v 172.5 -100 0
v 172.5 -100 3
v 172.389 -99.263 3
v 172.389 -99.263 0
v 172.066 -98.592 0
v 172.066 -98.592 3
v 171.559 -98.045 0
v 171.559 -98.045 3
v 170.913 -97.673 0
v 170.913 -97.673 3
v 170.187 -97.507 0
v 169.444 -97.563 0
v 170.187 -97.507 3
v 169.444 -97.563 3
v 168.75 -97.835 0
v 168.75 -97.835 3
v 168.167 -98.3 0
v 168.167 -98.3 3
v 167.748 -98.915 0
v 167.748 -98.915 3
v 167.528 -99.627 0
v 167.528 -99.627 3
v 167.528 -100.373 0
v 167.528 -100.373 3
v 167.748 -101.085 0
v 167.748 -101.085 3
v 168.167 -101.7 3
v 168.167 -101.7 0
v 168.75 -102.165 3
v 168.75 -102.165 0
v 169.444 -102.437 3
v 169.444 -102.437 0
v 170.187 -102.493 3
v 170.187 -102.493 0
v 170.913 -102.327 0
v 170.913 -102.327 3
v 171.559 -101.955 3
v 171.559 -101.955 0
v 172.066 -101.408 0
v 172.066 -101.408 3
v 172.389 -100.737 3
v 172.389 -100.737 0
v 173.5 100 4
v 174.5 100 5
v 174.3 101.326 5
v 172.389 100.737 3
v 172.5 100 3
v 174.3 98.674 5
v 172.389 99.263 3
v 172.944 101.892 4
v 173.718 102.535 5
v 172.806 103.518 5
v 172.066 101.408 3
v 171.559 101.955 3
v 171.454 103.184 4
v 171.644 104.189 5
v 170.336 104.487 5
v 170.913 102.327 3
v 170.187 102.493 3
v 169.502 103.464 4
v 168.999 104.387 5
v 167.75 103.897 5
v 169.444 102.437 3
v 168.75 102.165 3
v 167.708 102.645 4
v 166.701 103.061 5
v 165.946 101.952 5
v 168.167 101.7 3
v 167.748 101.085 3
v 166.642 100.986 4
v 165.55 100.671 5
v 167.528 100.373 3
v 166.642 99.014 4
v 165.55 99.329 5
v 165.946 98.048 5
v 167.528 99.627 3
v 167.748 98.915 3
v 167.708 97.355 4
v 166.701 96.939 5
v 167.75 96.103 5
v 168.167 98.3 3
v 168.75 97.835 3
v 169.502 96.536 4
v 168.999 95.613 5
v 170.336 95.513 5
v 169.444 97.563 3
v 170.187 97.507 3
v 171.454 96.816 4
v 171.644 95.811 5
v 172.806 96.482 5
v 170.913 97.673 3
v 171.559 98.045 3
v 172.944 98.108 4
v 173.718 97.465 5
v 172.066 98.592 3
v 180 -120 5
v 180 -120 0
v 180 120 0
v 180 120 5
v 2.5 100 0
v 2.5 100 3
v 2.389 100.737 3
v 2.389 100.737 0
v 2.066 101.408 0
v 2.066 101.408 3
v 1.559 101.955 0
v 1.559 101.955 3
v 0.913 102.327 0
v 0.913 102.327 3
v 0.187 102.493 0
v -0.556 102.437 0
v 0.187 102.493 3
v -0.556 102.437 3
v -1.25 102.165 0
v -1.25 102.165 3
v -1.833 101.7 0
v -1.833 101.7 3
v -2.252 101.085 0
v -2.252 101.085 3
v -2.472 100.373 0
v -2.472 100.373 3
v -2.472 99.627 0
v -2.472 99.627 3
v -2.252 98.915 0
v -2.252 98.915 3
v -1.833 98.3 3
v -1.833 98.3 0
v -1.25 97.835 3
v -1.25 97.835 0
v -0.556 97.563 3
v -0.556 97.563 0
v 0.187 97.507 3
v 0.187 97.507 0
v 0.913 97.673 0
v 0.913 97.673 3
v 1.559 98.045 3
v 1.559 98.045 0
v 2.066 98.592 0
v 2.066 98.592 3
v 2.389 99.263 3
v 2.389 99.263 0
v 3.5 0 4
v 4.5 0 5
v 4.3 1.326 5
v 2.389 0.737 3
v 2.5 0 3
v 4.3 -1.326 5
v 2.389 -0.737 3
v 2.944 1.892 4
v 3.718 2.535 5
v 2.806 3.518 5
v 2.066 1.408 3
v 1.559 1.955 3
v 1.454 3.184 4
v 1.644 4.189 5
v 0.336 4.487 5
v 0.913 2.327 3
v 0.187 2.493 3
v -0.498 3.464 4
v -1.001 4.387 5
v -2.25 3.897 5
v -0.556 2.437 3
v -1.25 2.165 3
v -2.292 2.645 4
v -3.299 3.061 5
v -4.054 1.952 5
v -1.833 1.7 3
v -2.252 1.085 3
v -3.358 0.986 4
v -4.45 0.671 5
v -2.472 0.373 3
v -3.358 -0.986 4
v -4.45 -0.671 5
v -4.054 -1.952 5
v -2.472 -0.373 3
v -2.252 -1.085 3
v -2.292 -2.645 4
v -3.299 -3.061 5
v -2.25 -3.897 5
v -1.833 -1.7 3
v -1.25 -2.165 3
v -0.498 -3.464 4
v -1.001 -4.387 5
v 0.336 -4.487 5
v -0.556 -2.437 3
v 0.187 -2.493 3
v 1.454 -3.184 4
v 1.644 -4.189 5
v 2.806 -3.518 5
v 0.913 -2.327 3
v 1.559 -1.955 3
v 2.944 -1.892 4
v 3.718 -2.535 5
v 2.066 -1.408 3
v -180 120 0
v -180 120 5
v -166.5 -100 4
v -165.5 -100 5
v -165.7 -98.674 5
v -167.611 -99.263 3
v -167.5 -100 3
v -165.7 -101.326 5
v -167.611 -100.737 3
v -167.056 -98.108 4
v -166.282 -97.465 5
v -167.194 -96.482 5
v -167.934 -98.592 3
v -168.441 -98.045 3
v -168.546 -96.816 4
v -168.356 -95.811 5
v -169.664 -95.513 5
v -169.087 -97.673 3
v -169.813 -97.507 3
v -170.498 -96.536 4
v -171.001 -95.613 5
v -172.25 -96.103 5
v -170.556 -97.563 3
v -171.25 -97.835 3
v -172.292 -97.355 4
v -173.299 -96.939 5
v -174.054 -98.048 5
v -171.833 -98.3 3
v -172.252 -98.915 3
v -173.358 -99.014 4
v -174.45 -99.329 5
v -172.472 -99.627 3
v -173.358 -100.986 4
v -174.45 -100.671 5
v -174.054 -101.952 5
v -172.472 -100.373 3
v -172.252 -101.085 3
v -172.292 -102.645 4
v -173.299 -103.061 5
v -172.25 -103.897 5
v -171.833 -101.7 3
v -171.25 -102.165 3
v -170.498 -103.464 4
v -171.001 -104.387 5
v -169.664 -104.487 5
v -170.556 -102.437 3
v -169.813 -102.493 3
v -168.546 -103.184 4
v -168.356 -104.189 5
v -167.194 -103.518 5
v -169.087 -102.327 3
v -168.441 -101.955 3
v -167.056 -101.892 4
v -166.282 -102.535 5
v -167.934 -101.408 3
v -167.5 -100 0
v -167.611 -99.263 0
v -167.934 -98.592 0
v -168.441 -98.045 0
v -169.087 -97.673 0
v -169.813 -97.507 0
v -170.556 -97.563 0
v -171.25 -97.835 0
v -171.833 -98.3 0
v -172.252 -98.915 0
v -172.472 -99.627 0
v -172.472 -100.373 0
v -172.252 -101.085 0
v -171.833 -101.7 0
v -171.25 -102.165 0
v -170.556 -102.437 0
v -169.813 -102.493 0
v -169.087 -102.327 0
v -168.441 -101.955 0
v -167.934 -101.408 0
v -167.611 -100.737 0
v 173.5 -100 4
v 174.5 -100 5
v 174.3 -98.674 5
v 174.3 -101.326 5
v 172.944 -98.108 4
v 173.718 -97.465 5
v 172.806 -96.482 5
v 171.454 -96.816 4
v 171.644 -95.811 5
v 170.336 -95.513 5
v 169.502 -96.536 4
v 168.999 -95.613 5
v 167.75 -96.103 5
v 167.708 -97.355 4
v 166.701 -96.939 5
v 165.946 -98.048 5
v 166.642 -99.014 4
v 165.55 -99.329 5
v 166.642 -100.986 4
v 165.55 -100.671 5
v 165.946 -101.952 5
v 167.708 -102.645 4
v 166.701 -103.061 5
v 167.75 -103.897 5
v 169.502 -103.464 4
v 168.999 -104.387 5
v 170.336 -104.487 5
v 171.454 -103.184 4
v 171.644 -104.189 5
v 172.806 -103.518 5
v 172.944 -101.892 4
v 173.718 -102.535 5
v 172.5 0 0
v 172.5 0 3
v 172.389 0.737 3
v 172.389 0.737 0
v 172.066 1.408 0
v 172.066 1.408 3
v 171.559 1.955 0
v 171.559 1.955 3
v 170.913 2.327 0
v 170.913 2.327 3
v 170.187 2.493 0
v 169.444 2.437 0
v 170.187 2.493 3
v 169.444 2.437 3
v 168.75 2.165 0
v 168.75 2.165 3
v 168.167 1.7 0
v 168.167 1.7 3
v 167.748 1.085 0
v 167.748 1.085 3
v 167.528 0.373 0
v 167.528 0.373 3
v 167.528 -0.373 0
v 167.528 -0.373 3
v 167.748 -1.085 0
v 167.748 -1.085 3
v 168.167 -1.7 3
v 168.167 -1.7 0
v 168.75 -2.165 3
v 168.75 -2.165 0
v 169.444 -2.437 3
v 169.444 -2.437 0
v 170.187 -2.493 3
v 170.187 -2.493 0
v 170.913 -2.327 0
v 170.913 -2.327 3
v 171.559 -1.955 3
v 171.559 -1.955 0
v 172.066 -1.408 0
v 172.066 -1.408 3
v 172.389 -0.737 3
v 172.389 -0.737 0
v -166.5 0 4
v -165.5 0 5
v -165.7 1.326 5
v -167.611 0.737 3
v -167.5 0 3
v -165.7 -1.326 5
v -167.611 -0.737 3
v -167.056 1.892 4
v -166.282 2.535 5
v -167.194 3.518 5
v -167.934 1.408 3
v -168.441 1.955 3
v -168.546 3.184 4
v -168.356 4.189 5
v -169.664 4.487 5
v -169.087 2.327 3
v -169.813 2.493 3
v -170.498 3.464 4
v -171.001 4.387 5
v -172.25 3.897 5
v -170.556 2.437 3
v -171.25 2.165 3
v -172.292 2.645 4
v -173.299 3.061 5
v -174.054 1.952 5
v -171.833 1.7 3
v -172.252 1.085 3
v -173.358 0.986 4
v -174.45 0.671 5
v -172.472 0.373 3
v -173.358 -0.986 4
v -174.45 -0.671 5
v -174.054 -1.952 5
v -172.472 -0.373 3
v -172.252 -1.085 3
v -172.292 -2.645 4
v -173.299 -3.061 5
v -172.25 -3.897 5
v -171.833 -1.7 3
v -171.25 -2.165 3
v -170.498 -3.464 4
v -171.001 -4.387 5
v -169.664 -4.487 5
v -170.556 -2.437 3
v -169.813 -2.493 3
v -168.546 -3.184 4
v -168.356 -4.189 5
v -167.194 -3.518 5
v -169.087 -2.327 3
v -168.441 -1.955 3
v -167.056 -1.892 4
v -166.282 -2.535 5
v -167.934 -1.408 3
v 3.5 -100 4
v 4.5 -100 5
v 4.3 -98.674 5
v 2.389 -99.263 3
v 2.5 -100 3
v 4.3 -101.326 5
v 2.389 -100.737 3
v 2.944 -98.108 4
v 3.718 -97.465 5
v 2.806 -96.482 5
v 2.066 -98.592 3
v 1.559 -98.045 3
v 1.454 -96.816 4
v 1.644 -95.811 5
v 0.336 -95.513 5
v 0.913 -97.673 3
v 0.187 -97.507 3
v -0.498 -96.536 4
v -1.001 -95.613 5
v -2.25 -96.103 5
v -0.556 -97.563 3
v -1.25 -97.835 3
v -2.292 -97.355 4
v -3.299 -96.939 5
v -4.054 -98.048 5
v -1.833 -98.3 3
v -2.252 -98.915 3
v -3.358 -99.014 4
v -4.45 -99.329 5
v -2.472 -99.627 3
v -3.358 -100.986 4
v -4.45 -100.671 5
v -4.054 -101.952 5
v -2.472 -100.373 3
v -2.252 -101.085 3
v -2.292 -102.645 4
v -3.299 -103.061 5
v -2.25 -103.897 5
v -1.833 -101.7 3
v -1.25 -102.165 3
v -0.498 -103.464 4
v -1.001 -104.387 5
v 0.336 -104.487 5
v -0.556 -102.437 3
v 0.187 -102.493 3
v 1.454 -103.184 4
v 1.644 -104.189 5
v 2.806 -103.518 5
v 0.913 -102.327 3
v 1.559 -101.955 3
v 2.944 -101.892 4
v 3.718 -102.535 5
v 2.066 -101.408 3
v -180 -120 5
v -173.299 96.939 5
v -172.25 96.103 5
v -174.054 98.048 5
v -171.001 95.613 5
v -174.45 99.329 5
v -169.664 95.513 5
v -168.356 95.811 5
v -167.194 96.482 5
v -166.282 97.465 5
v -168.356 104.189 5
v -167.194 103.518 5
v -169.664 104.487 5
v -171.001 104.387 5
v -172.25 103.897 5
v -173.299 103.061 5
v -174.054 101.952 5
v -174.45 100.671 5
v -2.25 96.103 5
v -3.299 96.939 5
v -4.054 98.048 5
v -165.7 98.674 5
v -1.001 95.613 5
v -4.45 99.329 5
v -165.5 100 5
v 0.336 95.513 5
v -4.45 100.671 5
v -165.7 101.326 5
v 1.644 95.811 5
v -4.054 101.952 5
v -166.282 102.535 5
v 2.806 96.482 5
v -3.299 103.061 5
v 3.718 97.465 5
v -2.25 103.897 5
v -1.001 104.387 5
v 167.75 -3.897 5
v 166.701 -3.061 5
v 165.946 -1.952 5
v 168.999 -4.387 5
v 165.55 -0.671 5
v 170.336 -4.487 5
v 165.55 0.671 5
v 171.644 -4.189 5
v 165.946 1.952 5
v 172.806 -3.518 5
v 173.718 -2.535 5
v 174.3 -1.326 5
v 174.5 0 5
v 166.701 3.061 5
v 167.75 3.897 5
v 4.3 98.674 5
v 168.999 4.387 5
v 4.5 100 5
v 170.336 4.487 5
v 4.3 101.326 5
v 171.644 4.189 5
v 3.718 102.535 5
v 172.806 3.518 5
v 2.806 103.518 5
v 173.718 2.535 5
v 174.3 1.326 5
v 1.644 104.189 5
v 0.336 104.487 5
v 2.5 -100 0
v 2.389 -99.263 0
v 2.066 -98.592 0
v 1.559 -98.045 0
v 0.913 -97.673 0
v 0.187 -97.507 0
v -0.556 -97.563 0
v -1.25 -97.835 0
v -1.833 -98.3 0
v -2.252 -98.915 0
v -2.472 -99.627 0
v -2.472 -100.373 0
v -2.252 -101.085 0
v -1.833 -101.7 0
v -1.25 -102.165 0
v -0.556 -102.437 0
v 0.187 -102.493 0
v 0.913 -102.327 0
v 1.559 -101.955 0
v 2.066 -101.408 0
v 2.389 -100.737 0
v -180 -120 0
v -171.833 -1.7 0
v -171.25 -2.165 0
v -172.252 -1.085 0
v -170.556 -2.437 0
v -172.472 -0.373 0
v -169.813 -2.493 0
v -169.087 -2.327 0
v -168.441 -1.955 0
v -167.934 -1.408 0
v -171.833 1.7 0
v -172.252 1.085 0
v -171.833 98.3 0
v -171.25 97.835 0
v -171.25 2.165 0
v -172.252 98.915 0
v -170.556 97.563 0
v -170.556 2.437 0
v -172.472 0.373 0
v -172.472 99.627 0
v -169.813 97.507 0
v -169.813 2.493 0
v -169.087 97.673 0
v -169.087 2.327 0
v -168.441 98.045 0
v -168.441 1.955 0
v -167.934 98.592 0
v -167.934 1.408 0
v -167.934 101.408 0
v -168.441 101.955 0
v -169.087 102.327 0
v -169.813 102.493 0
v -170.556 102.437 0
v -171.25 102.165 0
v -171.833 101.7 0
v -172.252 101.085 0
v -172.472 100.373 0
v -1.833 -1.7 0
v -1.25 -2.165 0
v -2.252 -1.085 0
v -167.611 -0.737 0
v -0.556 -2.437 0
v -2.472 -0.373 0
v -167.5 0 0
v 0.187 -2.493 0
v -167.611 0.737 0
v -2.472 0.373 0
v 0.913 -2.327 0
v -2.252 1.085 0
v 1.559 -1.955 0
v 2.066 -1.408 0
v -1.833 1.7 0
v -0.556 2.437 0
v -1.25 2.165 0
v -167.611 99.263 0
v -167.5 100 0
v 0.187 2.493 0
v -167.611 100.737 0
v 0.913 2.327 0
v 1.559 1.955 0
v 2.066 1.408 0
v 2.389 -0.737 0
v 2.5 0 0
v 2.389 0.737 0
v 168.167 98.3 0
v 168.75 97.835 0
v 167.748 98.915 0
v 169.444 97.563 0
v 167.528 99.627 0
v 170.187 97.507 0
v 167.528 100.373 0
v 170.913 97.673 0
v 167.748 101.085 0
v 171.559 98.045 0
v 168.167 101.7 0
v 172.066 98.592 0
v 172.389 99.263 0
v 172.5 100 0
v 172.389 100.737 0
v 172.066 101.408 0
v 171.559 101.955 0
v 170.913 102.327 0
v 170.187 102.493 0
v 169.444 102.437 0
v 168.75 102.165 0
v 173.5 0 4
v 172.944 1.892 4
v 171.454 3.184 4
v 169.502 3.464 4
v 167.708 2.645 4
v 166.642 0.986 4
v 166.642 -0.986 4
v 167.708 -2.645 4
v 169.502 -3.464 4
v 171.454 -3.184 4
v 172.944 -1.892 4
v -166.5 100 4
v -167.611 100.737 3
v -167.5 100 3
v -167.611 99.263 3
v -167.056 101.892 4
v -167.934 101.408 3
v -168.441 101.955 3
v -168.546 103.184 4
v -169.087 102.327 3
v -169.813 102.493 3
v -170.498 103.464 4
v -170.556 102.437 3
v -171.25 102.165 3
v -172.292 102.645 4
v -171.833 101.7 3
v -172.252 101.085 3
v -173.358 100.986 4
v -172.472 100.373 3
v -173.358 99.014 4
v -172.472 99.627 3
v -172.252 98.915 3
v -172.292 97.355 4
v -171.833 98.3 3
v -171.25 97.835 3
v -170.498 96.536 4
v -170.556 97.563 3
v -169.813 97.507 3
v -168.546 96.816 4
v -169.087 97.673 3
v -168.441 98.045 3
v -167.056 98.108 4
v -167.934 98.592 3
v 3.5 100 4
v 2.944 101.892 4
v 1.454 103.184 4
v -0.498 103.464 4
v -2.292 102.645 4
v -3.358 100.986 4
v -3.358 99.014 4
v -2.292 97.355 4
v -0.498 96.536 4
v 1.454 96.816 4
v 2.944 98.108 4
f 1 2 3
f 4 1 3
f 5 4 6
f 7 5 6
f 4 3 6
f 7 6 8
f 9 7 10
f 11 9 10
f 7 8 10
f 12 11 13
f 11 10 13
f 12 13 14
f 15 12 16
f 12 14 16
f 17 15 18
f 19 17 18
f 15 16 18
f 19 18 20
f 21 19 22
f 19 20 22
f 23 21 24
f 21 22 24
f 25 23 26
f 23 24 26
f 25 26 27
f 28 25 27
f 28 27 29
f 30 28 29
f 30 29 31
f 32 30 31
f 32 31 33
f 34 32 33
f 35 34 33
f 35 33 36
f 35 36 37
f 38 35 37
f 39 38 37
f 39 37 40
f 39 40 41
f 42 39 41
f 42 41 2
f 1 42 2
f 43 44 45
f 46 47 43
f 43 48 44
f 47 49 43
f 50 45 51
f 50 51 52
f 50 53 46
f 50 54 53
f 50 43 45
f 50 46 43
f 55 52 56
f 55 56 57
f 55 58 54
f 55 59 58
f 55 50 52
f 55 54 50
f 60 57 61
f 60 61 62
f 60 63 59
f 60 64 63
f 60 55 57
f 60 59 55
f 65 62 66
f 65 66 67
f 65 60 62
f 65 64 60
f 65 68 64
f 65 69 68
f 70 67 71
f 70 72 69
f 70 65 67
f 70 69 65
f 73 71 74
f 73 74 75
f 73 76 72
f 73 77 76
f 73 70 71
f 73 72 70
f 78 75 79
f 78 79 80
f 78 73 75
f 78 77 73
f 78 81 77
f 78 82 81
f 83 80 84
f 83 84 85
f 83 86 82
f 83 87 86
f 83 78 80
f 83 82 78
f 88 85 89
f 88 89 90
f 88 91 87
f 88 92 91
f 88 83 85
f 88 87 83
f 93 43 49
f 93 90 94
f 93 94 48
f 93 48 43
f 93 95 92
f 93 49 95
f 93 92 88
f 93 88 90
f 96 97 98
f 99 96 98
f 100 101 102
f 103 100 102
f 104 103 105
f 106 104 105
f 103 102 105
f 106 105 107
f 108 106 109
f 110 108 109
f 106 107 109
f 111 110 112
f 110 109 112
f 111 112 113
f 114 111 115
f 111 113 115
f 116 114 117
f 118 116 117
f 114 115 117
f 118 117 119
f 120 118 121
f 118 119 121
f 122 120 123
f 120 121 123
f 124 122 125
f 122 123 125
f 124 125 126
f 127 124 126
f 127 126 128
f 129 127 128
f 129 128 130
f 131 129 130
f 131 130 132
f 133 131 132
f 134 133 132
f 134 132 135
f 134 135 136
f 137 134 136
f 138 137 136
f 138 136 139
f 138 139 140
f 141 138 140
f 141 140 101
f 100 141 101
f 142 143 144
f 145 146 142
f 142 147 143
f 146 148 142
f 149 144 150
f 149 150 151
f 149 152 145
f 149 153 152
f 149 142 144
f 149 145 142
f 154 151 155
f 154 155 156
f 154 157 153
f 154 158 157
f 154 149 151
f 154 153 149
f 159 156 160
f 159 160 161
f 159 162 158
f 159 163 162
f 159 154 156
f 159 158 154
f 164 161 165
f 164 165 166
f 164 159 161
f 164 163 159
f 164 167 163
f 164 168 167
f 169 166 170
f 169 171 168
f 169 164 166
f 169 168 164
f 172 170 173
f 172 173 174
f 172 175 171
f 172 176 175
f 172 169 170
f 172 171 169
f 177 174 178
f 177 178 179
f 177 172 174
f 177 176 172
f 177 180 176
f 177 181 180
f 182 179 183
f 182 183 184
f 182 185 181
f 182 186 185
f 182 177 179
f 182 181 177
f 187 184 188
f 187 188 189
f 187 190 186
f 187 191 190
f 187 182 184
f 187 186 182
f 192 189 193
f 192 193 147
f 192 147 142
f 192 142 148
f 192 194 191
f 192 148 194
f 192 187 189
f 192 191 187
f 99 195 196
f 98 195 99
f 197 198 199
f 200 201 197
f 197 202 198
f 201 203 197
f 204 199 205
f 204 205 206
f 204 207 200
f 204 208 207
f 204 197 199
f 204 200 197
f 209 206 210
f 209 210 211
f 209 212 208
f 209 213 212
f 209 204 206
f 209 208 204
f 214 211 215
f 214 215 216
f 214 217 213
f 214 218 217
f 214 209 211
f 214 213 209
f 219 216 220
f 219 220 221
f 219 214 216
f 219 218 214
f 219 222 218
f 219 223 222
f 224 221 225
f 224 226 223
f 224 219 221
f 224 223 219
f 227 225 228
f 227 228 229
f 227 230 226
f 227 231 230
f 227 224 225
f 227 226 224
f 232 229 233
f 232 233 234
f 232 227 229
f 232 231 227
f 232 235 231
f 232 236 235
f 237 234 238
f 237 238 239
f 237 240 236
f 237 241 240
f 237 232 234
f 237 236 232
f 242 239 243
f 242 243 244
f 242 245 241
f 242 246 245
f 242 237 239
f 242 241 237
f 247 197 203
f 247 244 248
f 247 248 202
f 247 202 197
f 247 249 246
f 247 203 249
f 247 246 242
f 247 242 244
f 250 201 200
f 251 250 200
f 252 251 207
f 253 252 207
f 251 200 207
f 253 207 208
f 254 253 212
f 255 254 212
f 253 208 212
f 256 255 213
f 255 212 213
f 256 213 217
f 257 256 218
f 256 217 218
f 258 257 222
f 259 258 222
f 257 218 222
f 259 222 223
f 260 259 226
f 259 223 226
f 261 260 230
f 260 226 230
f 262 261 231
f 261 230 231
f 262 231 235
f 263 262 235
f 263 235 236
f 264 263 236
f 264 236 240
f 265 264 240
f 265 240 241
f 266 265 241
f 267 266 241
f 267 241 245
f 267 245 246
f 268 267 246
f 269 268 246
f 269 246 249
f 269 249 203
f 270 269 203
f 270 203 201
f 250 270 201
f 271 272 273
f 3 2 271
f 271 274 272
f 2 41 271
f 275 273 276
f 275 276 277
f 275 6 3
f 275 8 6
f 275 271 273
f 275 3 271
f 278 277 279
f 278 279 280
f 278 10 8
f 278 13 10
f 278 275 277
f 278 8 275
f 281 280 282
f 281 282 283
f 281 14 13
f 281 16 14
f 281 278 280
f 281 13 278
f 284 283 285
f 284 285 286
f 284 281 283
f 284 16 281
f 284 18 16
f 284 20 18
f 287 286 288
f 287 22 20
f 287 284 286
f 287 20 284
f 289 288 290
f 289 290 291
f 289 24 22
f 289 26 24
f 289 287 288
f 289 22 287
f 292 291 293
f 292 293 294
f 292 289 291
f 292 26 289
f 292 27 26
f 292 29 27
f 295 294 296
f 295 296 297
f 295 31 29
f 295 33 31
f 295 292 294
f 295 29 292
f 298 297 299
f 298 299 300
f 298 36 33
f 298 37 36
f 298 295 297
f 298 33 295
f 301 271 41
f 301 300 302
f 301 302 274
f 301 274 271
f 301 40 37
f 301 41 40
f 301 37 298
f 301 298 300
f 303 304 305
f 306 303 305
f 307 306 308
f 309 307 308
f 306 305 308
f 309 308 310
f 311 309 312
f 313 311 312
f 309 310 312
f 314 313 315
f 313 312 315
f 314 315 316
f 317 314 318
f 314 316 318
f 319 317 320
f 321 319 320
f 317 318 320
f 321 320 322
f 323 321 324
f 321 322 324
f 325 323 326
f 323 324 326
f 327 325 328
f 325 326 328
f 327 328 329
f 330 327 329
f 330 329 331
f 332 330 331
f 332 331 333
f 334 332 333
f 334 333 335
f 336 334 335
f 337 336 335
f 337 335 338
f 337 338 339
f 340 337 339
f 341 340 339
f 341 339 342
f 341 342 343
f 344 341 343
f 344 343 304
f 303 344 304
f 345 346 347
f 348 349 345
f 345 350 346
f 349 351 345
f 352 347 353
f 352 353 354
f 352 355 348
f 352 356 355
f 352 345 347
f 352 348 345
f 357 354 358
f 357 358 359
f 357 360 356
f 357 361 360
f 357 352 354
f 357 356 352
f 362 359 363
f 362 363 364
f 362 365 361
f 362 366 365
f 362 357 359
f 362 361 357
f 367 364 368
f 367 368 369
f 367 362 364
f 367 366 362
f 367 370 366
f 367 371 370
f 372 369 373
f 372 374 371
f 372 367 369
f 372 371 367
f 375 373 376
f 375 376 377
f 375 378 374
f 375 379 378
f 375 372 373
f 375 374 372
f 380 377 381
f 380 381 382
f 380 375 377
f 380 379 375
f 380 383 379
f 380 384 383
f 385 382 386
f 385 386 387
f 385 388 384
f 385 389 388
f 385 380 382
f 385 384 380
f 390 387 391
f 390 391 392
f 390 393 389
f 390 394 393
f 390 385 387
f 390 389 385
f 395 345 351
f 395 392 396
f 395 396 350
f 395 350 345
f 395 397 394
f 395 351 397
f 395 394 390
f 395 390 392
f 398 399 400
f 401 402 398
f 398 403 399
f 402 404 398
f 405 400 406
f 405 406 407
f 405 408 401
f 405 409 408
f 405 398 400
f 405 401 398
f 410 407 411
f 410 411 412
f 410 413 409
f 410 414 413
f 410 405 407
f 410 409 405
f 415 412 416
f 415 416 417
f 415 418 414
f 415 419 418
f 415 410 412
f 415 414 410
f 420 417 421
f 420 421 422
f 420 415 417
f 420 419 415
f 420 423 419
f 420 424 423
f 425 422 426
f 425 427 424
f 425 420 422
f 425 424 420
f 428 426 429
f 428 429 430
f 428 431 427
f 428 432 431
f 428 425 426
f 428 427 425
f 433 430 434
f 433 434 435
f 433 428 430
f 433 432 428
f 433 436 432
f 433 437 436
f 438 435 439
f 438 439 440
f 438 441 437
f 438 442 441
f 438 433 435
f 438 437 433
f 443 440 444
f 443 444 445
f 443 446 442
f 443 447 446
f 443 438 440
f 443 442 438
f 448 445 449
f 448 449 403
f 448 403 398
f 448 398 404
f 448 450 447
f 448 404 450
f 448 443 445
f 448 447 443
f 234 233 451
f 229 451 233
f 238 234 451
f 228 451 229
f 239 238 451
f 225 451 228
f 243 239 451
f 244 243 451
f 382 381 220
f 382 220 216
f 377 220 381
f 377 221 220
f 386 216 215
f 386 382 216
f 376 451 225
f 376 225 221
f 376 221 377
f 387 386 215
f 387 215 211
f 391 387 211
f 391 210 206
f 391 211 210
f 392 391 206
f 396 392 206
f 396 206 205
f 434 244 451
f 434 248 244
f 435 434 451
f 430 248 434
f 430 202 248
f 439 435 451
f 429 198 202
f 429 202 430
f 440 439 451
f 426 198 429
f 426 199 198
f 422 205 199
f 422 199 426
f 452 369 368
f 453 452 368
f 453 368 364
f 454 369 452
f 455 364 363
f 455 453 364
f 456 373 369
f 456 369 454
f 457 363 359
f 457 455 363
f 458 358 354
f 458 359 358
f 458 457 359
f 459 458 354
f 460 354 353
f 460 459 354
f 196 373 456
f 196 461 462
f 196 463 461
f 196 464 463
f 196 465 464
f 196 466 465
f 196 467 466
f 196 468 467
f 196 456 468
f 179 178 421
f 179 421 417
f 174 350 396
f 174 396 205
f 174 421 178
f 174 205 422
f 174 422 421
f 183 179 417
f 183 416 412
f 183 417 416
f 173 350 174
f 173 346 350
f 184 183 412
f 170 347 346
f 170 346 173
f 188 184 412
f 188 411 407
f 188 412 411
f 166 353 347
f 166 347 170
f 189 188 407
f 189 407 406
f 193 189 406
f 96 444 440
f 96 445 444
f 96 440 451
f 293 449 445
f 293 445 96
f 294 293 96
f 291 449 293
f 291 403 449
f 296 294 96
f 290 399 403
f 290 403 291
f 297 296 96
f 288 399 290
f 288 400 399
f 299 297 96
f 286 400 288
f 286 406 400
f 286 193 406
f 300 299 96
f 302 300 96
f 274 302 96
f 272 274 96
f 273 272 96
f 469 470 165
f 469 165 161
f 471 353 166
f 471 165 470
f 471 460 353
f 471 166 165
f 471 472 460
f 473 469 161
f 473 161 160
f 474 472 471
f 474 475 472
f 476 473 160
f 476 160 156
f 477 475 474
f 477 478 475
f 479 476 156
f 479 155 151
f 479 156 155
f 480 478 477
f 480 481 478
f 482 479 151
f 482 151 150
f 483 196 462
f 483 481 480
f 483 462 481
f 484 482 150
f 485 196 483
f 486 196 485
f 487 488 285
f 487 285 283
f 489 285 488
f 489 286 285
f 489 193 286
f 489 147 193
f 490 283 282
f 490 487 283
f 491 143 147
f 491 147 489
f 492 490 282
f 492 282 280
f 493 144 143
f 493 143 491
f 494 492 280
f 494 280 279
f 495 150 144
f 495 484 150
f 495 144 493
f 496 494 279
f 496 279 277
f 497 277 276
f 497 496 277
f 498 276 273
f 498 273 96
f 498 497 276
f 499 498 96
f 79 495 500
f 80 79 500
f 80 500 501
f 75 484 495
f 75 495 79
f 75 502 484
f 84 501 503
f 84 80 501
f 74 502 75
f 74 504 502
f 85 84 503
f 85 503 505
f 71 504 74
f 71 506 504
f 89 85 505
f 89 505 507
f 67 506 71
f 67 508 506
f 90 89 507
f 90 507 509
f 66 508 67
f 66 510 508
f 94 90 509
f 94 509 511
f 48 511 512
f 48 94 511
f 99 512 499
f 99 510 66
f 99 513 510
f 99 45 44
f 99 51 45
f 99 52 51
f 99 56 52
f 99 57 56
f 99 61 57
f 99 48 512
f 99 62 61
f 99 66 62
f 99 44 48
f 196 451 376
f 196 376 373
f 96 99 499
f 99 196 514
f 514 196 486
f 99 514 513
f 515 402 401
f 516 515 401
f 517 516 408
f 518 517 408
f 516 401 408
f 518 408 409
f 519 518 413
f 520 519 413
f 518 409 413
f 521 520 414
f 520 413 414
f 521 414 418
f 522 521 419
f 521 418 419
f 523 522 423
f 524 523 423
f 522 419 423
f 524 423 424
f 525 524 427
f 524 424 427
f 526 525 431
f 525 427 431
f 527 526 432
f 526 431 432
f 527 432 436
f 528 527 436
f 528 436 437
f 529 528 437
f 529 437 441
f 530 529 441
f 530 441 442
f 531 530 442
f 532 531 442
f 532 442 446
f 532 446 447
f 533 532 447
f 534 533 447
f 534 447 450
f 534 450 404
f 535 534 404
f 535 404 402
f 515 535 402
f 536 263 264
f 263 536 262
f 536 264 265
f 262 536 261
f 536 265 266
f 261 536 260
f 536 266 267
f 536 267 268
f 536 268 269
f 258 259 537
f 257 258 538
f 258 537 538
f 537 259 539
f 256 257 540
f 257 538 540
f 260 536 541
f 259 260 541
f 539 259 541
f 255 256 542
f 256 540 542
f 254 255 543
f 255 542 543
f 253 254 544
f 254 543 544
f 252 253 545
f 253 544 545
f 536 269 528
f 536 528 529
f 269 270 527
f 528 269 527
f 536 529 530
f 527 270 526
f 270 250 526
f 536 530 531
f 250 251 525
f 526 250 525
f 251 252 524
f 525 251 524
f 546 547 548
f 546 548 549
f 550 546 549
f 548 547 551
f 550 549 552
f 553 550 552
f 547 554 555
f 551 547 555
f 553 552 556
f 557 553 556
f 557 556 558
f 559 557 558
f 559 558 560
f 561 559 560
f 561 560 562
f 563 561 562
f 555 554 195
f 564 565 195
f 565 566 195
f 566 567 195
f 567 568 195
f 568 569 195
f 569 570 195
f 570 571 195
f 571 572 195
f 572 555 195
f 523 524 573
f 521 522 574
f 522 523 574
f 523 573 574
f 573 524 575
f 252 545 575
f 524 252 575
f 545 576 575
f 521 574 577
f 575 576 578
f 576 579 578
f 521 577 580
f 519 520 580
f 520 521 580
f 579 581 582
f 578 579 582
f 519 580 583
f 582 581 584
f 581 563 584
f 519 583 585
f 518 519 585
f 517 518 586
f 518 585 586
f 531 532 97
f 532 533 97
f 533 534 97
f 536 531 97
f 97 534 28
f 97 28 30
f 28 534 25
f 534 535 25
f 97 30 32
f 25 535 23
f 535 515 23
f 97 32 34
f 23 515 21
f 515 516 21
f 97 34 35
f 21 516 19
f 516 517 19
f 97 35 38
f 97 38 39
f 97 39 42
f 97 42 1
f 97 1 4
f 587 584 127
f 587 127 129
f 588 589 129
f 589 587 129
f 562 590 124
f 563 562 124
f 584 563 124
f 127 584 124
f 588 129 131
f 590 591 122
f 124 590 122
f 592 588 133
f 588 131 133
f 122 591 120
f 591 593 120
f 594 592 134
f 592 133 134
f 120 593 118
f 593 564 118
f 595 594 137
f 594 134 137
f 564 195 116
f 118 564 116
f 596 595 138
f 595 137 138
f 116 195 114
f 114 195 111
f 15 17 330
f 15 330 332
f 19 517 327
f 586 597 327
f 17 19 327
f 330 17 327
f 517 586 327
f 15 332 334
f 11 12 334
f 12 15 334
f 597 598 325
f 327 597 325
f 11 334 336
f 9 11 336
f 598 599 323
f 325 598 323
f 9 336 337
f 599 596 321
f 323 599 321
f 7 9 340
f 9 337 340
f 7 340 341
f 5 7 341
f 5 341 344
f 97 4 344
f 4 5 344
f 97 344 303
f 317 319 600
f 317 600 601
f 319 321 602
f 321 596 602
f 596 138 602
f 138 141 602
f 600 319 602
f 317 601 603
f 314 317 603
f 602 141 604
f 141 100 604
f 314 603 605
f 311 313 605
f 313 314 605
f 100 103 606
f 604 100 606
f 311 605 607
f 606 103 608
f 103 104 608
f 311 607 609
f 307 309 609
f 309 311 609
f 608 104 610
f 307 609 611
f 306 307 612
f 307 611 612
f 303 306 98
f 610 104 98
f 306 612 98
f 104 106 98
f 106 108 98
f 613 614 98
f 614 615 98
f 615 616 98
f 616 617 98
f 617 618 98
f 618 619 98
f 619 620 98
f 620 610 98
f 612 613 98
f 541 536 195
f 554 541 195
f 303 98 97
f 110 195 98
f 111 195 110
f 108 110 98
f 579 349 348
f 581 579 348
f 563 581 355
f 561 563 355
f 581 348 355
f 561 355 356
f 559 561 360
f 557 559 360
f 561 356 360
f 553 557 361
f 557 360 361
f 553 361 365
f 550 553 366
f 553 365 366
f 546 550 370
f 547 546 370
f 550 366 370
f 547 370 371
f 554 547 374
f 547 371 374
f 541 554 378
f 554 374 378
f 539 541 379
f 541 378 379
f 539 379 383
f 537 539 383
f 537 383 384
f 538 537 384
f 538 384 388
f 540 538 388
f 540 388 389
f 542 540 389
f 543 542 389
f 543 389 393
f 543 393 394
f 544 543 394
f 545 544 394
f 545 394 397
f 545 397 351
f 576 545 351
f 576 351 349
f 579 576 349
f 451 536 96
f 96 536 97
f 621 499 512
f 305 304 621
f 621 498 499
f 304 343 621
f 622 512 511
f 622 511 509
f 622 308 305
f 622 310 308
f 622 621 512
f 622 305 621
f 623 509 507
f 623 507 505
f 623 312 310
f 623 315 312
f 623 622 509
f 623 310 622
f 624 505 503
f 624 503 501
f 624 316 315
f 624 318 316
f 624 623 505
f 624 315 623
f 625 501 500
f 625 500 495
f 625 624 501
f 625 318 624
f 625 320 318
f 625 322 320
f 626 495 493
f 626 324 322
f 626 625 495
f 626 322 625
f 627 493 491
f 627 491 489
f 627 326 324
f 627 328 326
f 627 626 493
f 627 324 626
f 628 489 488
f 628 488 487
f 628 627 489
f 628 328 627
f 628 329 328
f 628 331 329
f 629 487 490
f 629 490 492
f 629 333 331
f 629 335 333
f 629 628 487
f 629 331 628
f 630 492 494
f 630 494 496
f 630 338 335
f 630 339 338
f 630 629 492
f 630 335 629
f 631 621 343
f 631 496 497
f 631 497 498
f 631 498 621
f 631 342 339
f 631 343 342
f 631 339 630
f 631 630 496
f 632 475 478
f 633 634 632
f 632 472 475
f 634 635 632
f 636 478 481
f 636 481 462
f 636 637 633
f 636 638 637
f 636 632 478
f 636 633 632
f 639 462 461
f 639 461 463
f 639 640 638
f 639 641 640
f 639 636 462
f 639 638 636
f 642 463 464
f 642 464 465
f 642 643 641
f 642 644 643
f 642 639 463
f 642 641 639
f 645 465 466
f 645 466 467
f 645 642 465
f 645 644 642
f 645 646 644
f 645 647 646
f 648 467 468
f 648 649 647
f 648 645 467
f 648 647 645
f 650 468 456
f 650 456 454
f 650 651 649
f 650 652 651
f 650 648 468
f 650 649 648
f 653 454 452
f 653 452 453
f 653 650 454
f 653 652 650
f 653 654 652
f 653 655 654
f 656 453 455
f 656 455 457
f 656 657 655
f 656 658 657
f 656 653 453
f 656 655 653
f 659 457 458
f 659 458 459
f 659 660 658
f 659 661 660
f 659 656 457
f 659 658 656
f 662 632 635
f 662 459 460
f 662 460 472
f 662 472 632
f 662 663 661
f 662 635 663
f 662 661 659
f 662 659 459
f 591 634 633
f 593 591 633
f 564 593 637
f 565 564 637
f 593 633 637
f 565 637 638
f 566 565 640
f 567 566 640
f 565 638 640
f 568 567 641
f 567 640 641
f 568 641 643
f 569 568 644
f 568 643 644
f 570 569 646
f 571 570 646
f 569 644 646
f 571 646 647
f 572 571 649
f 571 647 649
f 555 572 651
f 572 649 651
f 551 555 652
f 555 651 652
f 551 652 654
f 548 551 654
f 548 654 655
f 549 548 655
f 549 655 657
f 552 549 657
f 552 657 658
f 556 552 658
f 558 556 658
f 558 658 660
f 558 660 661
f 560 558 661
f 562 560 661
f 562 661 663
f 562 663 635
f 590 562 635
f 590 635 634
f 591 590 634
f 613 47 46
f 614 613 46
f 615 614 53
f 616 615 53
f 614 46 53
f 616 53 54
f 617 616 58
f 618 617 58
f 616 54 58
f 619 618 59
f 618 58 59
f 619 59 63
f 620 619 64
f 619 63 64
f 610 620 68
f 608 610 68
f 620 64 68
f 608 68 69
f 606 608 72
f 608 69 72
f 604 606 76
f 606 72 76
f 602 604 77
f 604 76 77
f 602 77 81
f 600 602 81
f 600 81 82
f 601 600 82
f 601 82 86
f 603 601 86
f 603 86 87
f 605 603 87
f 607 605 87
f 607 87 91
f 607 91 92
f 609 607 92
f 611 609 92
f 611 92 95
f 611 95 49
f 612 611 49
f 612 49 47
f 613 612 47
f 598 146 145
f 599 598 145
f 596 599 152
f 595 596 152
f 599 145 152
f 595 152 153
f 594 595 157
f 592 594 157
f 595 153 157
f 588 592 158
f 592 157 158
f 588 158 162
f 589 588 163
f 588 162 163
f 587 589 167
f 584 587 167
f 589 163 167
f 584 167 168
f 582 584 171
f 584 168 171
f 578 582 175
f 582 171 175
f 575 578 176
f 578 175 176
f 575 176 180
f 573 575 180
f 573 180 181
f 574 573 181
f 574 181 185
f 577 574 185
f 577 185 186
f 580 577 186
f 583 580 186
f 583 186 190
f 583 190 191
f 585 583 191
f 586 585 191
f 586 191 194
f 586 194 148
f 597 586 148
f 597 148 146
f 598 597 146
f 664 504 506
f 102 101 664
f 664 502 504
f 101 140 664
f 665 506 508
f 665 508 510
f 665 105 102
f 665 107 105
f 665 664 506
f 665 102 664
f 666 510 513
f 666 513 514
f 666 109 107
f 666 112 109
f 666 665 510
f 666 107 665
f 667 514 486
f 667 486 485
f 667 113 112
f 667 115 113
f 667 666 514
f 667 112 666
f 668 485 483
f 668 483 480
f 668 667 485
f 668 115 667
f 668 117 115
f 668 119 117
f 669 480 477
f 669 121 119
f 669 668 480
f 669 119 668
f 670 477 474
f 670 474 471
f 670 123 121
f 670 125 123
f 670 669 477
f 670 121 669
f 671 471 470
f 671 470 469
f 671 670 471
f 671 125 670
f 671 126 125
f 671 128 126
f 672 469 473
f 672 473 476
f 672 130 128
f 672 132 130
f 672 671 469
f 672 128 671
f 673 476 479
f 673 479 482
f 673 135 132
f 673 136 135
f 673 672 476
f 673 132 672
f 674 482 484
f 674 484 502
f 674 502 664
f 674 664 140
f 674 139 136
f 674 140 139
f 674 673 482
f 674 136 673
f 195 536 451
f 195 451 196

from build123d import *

# Parameters (mm, degrees)
ESQUISSE1_W             = 360
ESQUISSE1_H             = 240
BOSS_EXTRU_1_DEPTH      = 5
ESQUISSE2_R             = 2.5
ENL_V_MAT_EXTRU_1_DEPTH = 217.390850084
CHANFREIN1_SIZE         = 2


with BuildPart() as part:
    # Esquisse1 → Boss.-Extru.1 (new body)
    with BuildSketch(Plane.XY):
        Rectangle(ESQUISSE1_W, ESQUISSE1_H)
    extrude(amount=BOSS_EXTRU_1_DEPTH)

    # Esquisse2 → Enlèv. mat.-Extru.1 (cut, through all)
    with BuildSketch(Plane.XY.offset(5)):
        with Locations((-170, 100)):
            Circle(ESQUISSE2_R)
        with Locations((-170, 0)):
            Circle(ESQUISSE2_R)
        with Locations((-170, -100)):
            Circle(ESQUISSE2_R)
        with Locations((0, 100)):
            Circle(ESQUISSE2_R)
        Circle(ESQUISSE2_R)
        with Locations((0, -100)):
            Circle(ESQUISSE2_R)
        with Locations((170, -100)):
            Circle(ESQUISSE2_R)
        with Locations((170, 0)):
            Circle(ESQUISSE2_R)
        with Locations((170, 100)):
            Circle(ESQUISSE2_R)
    extrude(amount=-ENL_V_MAT_EXTRU_1_DEPTH, mode=Mode.SUBTRACT)

    # Chanfrein1
    chanfrein1_edges = [part.edges().sort_by_distance(p)[0] for p in [
        (-172.5, 0, 5),
        (-172.5, -100, 5),
        (-2.5, 100, 5),
        (-2.5, 0, 5),
        (-2.5, -100, 5),
        (167.5, -100, 5),
        (167.5, 0, 5),
        (167.5, 100, 5),
        (-172.5, 100, 5),
    ]]
    chamfer(chanfrein1_edges, length=CHANFREIN1_SIZE)


solid = part.part
